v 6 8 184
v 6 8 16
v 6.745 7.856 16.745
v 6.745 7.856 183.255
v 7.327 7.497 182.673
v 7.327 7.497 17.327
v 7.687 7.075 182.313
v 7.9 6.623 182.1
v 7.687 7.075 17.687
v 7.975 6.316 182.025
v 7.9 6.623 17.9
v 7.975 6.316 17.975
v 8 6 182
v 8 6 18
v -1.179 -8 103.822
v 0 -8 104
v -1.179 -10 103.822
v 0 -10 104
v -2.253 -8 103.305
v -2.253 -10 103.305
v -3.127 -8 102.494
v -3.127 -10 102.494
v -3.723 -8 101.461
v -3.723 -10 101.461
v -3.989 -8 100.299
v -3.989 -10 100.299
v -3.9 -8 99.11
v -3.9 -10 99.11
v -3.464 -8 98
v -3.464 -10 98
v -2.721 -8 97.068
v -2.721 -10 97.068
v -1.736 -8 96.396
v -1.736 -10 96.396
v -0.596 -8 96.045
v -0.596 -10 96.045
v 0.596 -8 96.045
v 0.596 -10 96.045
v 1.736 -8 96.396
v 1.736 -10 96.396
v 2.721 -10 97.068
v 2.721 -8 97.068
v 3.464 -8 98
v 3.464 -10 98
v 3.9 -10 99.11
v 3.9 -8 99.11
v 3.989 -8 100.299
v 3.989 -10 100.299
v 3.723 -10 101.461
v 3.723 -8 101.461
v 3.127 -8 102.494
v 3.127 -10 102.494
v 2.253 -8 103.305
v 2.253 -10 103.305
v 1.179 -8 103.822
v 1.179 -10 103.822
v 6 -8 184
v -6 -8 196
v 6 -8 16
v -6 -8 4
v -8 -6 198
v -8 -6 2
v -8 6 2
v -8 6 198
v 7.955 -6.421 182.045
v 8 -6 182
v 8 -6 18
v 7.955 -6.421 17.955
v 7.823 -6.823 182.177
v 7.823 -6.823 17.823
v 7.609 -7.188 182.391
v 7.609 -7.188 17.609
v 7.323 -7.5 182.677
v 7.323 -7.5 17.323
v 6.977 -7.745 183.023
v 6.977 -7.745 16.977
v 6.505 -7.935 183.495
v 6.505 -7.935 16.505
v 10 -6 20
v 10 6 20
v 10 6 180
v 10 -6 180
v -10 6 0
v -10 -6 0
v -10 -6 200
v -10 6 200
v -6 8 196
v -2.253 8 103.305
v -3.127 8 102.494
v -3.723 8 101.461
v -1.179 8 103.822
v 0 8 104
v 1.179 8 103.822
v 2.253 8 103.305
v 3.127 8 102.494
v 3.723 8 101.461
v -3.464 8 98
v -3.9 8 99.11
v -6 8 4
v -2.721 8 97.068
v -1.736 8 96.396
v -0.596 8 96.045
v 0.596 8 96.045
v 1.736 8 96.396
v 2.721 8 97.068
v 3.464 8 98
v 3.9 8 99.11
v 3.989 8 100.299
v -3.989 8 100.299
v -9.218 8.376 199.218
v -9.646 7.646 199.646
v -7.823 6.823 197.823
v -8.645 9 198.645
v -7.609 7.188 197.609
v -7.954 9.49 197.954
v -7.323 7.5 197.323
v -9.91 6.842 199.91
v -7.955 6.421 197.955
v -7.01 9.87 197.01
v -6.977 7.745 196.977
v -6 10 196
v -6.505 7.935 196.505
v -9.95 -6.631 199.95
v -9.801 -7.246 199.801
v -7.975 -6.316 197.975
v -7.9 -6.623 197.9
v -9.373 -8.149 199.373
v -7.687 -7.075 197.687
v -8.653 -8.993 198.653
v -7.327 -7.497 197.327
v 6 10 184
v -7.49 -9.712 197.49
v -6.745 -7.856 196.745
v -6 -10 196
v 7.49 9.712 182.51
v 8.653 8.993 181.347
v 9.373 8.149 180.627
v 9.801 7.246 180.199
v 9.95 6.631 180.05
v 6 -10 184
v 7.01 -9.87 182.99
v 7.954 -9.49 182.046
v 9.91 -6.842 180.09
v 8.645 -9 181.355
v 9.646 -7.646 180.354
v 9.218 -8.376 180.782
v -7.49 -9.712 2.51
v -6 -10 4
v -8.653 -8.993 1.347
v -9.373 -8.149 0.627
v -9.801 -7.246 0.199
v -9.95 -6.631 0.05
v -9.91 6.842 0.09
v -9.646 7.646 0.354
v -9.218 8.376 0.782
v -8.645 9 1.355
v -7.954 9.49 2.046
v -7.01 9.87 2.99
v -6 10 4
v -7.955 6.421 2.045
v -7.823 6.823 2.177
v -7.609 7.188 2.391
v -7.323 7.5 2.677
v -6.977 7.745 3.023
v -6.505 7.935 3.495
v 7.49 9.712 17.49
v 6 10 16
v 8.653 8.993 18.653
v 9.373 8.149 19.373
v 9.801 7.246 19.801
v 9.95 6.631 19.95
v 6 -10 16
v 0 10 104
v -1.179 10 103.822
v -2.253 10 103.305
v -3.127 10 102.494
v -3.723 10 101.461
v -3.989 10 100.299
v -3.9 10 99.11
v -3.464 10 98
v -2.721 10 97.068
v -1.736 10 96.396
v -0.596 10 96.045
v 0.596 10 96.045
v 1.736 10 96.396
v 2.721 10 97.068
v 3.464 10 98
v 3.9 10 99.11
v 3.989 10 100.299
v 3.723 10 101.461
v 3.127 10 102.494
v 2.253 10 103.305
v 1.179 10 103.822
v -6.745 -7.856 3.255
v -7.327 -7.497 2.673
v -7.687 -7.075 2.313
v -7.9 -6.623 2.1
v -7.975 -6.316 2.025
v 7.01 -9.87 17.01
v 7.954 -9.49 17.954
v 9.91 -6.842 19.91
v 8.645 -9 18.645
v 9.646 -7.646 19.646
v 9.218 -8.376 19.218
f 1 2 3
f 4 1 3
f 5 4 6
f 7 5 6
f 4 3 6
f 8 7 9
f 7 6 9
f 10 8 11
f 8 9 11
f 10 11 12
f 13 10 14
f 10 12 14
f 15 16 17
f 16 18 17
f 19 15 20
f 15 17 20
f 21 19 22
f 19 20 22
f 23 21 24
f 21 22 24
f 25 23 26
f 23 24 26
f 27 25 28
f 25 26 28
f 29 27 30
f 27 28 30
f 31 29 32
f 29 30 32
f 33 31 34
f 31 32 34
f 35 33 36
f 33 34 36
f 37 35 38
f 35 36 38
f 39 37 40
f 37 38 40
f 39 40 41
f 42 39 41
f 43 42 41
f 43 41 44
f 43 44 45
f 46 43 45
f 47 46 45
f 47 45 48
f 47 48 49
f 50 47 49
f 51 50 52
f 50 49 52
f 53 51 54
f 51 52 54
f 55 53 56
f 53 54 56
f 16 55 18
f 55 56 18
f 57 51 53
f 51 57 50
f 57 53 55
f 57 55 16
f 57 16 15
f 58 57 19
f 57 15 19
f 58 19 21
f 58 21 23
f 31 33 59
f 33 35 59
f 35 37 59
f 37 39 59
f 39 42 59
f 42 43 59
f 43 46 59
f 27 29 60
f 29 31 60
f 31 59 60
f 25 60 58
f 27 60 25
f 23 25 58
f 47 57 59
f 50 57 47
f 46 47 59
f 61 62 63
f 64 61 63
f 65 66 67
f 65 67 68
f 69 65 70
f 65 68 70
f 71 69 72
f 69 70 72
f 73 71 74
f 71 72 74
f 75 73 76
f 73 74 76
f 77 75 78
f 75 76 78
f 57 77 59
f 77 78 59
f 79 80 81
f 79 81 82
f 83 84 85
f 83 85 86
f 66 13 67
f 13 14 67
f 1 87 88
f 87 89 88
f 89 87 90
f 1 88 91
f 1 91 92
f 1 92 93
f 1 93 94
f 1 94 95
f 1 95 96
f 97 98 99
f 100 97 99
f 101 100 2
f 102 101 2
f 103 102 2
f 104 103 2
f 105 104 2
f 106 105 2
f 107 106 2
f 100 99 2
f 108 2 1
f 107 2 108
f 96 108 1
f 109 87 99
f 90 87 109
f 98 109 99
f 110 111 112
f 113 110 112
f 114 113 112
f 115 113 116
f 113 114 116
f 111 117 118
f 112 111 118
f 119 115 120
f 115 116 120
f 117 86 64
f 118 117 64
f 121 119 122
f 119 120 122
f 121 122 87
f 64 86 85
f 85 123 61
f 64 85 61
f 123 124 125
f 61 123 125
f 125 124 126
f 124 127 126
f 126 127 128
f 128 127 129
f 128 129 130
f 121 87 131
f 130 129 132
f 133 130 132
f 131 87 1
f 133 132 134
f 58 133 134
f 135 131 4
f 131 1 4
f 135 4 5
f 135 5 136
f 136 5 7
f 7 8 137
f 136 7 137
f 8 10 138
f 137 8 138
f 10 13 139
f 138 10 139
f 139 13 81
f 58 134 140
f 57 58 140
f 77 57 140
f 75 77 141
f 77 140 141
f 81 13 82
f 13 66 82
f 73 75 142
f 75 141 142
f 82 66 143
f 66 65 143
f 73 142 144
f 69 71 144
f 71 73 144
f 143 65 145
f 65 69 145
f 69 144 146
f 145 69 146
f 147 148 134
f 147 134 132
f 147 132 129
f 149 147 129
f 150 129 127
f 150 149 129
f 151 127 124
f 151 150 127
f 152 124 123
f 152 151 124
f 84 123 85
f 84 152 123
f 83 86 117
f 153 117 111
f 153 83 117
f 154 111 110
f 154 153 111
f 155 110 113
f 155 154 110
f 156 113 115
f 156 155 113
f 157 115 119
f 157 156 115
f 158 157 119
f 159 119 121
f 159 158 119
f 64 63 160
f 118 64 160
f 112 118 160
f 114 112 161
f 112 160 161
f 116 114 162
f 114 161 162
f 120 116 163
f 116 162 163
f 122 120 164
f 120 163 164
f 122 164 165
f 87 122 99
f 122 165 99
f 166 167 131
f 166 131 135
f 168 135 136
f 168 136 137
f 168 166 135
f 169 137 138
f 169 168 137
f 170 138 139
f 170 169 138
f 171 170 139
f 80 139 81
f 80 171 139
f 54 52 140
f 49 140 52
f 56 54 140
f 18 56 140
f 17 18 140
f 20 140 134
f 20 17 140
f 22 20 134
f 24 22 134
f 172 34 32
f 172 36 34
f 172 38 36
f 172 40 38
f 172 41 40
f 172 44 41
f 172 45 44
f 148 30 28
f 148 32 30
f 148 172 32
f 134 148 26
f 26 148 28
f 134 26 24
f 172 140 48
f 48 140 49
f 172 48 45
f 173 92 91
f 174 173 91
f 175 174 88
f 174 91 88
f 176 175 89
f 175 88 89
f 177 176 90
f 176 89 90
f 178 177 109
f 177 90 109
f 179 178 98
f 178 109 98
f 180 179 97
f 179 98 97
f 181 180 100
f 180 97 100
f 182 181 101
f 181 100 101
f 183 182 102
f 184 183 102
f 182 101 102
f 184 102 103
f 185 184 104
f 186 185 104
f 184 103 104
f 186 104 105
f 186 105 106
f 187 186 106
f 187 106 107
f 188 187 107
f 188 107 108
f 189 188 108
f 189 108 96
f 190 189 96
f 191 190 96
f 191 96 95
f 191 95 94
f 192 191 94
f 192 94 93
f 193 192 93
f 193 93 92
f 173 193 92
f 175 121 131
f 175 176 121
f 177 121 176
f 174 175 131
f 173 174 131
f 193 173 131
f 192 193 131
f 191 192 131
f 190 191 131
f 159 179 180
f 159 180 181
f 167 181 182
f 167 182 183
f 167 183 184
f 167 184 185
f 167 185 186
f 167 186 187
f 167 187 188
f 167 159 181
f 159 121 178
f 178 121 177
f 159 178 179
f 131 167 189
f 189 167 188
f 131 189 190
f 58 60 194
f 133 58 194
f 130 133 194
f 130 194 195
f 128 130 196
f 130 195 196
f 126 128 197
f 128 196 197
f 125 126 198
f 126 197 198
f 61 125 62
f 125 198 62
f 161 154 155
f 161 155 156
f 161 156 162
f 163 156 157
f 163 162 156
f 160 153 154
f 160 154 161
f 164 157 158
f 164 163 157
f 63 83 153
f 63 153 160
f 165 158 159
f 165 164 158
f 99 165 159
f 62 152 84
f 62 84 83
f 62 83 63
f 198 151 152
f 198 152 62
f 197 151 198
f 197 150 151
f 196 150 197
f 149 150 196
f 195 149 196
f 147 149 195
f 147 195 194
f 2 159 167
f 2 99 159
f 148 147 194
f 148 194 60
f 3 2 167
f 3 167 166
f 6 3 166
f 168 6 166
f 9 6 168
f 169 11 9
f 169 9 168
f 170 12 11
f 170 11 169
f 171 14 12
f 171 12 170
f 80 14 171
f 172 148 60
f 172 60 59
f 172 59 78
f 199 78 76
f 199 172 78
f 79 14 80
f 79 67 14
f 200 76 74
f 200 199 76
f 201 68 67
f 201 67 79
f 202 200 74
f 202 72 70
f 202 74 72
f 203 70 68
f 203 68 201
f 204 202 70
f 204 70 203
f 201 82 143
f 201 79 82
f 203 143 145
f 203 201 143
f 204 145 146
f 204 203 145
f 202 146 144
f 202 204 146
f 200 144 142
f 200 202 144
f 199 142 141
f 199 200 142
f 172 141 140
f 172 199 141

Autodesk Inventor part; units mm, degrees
ref_plane "YZ Plane" through (0, 0, 0) normal (1, 0, 0) x (0, 1, 0)
ref_plane "Piano iniziale" through (0, 0, 0) normal (0, 0, 1) x (1, 0, 0)
ref_plane "Piano finale" through (0, 0, 200) normal (0, 0, 1) x (1, 0, 0)
sketch "Schizzo" plane through (0, 0, 0) normal (0, 0, 1) x (1, 0, 0)
  line L0 (-10, -6) -> (-10, 6)
  line L1 (-6, 10) -> (6, 10)
  line L2 (10, 6) -> (10, -6)
  line L3 (6, -10) -> (-6, -10)
  arc A0 (-10, -6) -> (-6, -10) centre (-6, -6) ccw
  arc A1 (10, 6) -> (6, 10) centre (6, 6) ccw
  arc A2 (-6, 10) -> (-10, 6) centre (-6, 6) ccw
  arc A3 (6, -10) -> (10, -6) centre (6, -6) ccw
  arc A4 (-6, 8) -> (-8, 6) centre (-6, 6) ccw
  line L4 (-6, 8) -> (6, 8)
  arc A5 (8, 6) -> (6, 8) centre (6, 6) ccw
  line L5 (8, 6) -> (8, -6)
  arc A6 (6, -8) -> (8, -6) centre (6, -6) ccw
  line L6 (6, -8) -> (-6, -8)
  arc A7 (-8, -6) -> (-6, -8) centre (-6, -6) ccw
  line L7 (-8, -6) -> (-8, 6)
  line L8 (0, 15.1598) -> (0, -15.1598) construction
  line L9 (-15.1598, 0) -> (15.1598, 0) construction
  dimension "d7" = 4
  dimension "d9" = 20
  dimension "d11" = 20
  dimension "d12" = 2
  dimension "d15" = 10
  dimension "d16" = 10
extrude "Corpo" add sketch "Schizzo" along normal up to surface (200 mm away) from surface at 0
sketch "Sketch3" plane through (0, 0, 0) normal (0, 0, 1) x (1, 0, 0)
  line L0 (0, 0) -> (10, 0)
ref_plane "Work Plane3" through (0, 0, 0) normal (0, -1, 0) x (1, 0, 0)
sketch "Sketch4" plane through (0, 0, 0) normal (0, -1, 0) x (1, 0, 0)
  line L0 (-2, 0) -> (12, 0)
  line L1 (-2, 200) -> (12, 200)
  dimension "d18" = 200
sketch "Schizzo5" plane through (-6, -10, 0) normal (0, -1, 0) x (1, 0, 0)
  line L0 (-4, 0) -> (0, 0) projected
  line L1 (-4, 0) -> (27.2685, 31.2685)
  line L2 (-4, 0) -> (40.2203, 0) construction
  line L3 (27.2685, 31.2685) -> (27.2685, 0)
  line L4 (27.2685, 0) -> (-4, 0)
  line L5 (-4, 200) -> (31.4981, 164.5019)
  line L6 (-4, 200) -> (46.2019, 200) construction
  line L7 (31.4981, 164.5019) -> (31.4981, 200)
  line L8 (31.4981, 200) -> (-4, 200)
  point P0 (6, 0)
  dimension "d19" = 45
  dimension "d20" = 45
extrude "Estrusione2" cut sketch "Schizzo5" against normal up to next
sketch "Schizzo6" plane through (-6, 10, 196) normal (0, 1, 0) x (1, 0, 0)
  line L0 (12, 180) -> (0, 192) projected
  line L1 (16, 176) -> (16, 16) projected
  point P0 (6, 196)
  point P1 (6, 96)
  point P2 (6, 186)
  point P3 (16, 96)
hole "Foro1" at (0, 10, 100) direction (0, -1, 0) diameter 8 end through all
equation "\"d7\" = G_IR"
equation "\"d9\" = G_W"
equation "\"d11\" = G_H"
equation "\"d12\" = G_T"
equation "\"d15\" = 0.5 * d9"
equation "\"d16\" = 0.5 * d11"
equation "\"d3\" = G_L"
equation "\"G_W\" = 20"
equation "\"G_H\" = 20"
equation "\"G_T\" = 2"
equation "\"G_IR\" = 4"
equation "\"G_L\" = d18"
equation "\"G_OFFSET_START\" = 0"
equation "\"G_OFFSET_END\" = 0"
properties part number "ISO 10799-2 - 20x20x2 - 200" material "Acciaio, Dolce"
